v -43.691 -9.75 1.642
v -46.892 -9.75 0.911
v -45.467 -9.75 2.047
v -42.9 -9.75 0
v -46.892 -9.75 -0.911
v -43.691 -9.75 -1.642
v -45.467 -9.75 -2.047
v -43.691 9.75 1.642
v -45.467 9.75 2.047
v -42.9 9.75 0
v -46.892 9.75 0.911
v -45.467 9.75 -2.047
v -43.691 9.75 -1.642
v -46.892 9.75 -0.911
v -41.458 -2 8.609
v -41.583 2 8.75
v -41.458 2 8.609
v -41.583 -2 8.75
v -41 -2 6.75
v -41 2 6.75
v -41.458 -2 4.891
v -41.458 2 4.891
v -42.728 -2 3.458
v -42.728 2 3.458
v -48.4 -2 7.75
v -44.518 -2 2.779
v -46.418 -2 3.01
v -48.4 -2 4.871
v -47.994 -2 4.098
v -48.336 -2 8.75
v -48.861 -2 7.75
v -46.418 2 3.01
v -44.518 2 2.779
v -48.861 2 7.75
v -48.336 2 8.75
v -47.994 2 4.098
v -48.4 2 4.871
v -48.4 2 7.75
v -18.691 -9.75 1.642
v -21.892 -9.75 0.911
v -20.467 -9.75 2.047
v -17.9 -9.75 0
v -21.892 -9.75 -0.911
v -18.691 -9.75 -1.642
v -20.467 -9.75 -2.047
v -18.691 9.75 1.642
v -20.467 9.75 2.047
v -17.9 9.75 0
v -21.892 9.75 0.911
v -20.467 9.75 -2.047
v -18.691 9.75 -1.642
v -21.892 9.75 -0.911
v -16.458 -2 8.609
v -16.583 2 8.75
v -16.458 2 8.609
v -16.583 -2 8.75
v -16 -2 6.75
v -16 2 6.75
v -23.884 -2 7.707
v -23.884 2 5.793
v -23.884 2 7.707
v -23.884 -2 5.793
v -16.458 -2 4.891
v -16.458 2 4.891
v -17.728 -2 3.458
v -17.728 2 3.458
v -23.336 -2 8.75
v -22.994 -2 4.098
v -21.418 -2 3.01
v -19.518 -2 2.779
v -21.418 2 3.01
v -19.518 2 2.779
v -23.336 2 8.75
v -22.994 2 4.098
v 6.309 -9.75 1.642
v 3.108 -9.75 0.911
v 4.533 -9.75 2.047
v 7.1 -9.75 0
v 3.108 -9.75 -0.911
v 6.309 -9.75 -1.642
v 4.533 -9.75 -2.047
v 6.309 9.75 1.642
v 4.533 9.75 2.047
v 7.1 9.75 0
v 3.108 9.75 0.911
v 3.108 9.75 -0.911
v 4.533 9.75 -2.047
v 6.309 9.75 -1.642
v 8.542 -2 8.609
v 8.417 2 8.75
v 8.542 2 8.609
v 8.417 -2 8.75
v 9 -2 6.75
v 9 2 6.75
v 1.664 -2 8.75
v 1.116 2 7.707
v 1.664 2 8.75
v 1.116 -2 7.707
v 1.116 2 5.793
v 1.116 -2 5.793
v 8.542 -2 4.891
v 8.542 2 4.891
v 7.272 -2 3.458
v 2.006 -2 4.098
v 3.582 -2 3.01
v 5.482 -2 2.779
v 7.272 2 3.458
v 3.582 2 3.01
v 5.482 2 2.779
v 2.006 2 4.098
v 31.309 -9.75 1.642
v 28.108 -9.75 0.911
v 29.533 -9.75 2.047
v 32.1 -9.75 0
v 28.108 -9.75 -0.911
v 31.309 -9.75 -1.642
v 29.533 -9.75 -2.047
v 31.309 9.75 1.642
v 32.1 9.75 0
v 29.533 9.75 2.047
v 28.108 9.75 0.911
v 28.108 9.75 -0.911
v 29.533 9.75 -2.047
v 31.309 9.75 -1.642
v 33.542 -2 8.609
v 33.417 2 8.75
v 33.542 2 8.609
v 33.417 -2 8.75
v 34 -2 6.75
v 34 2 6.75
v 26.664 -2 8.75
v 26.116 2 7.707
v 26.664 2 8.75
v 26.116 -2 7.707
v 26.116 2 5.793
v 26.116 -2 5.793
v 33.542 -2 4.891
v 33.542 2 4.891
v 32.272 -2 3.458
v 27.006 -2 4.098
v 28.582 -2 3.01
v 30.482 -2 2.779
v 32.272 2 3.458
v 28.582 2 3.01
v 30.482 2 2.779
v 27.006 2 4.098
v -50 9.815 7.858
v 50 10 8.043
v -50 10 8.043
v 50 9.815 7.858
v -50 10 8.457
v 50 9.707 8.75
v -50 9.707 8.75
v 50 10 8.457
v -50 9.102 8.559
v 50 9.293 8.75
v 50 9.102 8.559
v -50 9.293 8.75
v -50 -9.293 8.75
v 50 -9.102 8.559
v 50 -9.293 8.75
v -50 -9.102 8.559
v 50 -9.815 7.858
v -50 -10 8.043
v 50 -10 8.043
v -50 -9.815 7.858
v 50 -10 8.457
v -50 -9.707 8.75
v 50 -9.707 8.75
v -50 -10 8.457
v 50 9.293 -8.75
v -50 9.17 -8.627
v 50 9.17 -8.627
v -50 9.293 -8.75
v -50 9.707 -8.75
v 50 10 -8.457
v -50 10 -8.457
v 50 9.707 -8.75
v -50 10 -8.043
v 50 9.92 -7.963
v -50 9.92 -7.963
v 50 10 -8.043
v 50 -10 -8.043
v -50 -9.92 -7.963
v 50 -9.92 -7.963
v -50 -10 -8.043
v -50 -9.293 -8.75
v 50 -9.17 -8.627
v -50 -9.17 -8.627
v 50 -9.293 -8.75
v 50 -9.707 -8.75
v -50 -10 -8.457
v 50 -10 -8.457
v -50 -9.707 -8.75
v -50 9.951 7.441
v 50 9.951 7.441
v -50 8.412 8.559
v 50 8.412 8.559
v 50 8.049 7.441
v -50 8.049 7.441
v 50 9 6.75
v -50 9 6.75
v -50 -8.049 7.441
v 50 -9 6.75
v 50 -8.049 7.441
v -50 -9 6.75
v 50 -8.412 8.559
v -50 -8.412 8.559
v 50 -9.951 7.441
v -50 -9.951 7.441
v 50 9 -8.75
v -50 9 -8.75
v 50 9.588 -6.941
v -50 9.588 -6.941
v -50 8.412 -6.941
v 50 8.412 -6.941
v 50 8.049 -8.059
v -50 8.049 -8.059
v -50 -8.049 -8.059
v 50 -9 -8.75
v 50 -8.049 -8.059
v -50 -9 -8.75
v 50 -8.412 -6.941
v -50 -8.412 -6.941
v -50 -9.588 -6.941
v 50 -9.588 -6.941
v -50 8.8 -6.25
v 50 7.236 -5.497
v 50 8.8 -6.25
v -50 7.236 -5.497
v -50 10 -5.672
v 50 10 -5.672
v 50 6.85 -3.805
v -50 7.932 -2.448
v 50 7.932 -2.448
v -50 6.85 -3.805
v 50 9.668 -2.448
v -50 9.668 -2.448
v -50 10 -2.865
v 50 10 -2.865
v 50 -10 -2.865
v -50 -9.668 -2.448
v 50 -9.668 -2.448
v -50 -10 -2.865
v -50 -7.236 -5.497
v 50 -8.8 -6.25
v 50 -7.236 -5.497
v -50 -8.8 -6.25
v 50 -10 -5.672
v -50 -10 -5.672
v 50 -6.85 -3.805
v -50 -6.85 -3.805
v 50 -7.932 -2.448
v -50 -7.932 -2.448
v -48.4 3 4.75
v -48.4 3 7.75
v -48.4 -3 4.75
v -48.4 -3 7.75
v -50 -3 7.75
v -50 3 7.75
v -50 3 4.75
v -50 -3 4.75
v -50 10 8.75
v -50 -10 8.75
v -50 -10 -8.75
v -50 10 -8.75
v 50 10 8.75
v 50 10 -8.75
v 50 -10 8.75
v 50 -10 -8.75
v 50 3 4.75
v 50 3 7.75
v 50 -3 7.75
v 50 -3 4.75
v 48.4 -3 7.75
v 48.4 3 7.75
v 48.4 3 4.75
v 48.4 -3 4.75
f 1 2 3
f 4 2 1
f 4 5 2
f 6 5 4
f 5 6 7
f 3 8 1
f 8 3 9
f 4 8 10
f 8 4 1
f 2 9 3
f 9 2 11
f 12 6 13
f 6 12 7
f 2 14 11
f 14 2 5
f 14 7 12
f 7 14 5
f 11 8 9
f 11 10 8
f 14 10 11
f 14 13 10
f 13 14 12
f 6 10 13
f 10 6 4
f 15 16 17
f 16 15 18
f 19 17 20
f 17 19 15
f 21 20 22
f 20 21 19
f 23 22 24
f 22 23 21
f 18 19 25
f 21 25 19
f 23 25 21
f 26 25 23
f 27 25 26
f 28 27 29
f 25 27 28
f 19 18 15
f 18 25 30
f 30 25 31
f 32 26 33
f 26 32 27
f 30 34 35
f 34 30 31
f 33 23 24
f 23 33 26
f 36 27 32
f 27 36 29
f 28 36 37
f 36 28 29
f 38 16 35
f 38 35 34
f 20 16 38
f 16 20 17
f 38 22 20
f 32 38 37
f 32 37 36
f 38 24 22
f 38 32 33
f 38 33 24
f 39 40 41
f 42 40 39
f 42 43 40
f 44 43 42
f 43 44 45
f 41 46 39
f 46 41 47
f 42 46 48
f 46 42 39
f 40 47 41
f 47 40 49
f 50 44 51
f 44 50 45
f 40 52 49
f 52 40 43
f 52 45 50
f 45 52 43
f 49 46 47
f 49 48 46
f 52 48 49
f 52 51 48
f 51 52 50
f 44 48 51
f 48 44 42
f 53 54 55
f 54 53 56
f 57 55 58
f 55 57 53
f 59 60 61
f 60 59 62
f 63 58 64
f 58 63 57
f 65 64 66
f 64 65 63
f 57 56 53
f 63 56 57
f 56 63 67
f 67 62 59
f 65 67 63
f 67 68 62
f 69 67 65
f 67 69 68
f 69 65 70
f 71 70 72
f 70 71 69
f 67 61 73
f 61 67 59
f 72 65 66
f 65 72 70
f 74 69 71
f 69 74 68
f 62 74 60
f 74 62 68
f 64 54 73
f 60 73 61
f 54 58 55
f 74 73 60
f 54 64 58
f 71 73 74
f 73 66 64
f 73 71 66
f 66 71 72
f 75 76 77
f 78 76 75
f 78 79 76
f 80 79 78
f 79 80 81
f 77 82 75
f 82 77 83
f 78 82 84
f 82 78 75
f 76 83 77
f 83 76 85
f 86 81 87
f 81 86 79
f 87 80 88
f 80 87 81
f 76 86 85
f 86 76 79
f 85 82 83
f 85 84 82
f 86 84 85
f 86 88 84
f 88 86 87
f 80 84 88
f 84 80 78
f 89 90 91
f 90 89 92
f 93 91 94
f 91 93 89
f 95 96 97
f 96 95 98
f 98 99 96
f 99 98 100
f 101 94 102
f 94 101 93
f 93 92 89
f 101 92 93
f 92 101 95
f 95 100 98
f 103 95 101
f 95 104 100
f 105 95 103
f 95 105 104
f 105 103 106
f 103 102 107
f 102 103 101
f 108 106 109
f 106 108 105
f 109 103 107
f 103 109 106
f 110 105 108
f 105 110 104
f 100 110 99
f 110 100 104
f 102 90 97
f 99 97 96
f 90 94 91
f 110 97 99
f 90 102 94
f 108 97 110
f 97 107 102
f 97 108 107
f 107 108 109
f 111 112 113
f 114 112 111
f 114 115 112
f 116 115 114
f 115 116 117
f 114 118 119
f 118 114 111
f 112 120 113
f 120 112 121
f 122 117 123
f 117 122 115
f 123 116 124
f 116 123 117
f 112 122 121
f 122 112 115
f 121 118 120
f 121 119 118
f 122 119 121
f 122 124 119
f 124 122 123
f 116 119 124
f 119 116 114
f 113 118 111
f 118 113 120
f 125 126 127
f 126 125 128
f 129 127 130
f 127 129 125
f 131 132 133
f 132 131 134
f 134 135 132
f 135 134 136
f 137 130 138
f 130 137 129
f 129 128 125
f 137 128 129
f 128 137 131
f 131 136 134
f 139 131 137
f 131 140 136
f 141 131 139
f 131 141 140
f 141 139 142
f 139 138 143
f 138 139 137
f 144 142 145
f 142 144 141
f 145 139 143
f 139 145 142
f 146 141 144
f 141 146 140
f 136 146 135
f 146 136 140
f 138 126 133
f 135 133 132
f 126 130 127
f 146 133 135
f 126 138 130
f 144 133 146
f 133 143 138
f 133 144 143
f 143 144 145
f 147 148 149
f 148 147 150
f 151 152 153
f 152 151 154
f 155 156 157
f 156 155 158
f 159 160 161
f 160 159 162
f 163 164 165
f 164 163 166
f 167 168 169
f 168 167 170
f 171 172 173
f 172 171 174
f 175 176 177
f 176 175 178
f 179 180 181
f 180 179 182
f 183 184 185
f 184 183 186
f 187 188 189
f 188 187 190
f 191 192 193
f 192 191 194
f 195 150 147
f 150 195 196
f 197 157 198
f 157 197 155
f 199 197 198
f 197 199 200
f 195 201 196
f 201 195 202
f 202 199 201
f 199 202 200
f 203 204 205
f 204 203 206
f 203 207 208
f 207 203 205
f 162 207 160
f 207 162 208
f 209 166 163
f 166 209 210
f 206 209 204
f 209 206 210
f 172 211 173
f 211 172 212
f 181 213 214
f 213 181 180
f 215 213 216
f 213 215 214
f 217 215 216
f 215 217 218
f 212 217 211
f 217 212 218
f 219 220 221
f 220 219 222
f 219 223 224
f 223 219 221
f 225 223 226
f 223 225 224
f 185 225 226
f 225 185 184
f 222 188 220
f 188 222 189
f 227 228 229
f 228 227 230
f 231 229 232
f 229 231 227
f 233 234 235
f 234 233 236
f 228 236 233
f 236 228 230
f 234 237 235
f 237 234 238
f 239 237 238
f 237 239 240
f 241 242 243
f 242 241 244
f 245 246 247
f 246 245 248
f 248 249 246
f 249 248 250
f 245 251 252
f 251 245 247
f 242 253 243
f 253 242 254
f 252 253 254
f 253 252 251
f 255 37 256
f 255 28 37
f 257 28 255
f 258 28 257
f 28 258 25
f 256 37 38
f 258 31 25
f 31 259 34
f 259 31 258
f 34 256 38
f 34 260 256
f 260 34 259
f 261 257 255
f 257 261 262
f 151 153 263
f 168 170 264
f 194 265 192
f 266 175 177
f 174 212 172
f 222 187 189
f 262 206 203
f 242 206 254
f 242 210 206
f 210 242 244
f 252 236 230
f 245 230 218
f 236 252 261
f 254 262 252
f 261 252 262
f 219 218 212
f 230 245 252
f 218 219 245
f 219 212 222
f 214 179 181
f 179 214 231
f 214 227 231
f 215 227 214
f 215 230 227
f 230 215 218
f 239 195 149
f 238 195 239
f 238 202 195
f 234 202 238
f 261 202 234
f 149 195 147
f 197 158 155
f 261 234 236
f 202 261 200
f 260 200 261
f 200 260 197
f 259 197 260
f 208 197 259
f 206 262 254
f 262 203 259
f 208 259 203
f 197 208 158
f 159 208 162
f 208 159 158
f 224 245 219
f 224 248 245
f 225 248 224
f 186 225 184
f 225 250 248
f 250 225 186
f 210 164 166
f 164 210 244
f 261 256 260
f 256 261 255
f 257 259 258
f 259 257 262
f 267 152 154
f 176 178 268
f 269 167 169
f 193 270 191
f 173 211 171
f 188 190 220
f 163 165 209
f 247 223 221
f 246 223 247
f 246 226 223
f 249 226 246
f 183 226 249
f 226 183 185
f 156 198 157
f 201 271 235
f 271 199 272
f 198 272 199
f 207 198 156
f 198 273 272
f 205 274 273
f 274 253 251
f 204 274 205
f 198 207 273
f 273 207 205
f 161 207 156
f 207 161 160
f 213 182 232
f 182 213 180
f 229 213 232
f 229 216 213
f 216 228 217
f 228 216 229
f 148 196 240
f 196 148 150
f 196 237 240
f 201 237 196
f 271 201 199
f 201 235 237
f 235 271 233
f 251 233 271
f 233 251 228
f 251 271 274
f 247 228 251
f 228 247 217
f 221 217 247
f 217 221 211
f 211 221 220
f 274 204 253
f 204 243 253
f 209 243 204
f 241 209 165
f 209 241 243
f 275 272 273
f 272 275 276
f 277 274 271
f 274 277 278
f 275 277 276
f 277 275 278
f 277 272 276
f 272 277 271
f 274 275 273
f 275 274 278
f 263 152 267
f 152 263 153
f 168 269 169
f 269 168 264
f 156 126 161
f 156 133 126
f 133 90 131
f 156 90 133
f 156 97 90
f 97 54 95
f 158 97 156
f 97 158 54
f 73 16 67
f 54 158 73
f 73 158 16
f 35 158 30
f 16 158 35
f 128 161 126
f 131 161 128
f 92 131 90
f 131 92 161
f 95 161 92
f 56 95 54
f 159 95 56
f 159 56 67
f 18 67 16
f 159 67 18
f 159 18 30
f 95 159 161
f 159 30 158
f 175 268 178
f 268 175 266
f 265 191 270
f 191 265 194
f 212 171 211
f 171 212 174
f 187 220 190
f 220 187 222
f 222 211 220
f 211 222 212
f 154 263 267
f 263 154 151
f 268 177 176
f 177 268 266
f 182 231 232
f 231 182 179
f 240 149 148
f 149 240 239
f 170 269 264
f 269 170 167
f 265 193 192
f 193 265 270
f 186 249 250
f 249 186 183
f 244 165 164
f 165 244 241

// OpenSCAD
// Parameters
rail_L = 100.0; //[50.0:200.0:1]
rail_W = 20.0; //[10.0:40.0:0.5]
rail_H = 17.5; //[8.75:35.0:0.5]
hole_d = 4.2; //[2.0:8.0:0.1]
hole_pitch = 25.0; //[10.0:60.0:1]
hole_edge_offset = 5.0; //[2.5:12.0:0.5]
hole_count = 4; //[2:8:1]
hole_csk_d = 8.0; //[5.0:14.0:0.5]
hole_csk_angle = 90.0; //[60.0:120.0:1]
overlap = 1.0; //[0.5:2.0:0.1]
edge_chamfer = 1.0; //[0.5:2.5:0.1]
fillet_r = 1.0; //[0.5:3.0:0.1]
groove_r = 2.0; //[1.0:4.0:0.1]
groove_depth = 1.2; //[0.5:3.0:0.1]
groove_z = 4.5; //[2.0:8.0:0.1]
csk_depth = 3.0; //[1.0:6.0:0.1]
end_mark_depth = 0.6; //[0.2:1.5:0.1]
end_mark_W = 6.0; //[3.0:12.0:0.5]
end_mark_H = 3.0; //[1.5:8.0:0.5]

// Rail Body
module rail_body() {
  color("Silver")
  cube([rail_L, rail_W, rail_H], center=true);
}

// Mounting Holes
module mounting_holes_pattern() {
  union() {
    for (i = [0:hole_count-1]) {
      translate([-rail_L/2 + hole_edge_offset + i*hole_pitch, 0, 0])
      rotate([90, 0, 0])
      cylinder(h=rail_H + 2*overlap, r=hole_d/2, center=true);
      
      translate([-rail_L/2 + hole_edge_offset + i*hole_pitch, 0, rail_H/2 - (csk_depth + overlap)/2])
      rotate([90, 0, 0])
      cylinder(h=csk_depth + overlap, r=hole_csk_d/2, center=true);
    }
  }
}

// Edge Chamfers
module edge_chamfers() {
  union() {
    translate([0, rail_W/2 - edge_chamfer/2, rail_H/2 - edge_chamfer/2])
    rotate([45, 0, 0])
    cube([rail_L + 2*overlap, edge_chamfer, edge_chamfer], center=true);
    
    translate([0, -rail_W/2 + edge_chamfer/2, rail_H/2 - edge_chamfer/2])
    rotate([-45, 0, 0])
    cube([rail_L + 2*overlap, edge_chamfer, edge_chamfer], center=true);
    
    translate([0, rail_W/2 - edge_chamfer/2, -rail_H/2 + edge_chamfer/2])
    rotate([-45, 0, 0])
    cube([rail_L + 2*overlap, edge_chamfer, edge_chamfer], center=true);
    
    translate([0, -rail_W/2 + edge_chamfer/2, -rail_H/2 + edge_chamfer/2])
    rotate([45, 0, 0])
    cube([rail_L + 2*overlap, edge_chamfer, edge_chamfer], center=true);
  }
}

// Corner Fillets
module corner_fillets() {
  union() {
    translate([0, rail_W/2 - fillet_r, rail_H/2 - fillet_r])
    rotate([0, 90, 0])
    cylinder(h=rail_L + 2*overlap, r=fillet_r, center=true);
    
    translate([0, -rail_W/2 + fillet_r, rail_H/2 - fillet_r])
    rotate([0, 90, 0])
    cylinder(h=rail_L + 2*overlap, r=fillet_r, center=true);
    
    translate([0, rail_W/2 - fillet_r, -rail_H/2 + fillet_r])
    rotate([0, 90, 0])
    cylinder(h=rail_L + 2*overlap, r=fillet_r, center=true);
    
    translate([0, -rail_W/2 + fillet_r, -rail_H/2 + fillet_r])
    rotate([0, 90, 0])
    cylinder(h=rail_L + 2*overlap, r=fillet_r, center=true);
  }
}

// Raceway Grooves
module raceway_grooves() {
  union() {
    translate([0, rail_W/2 - groove_depth, -rail_H/2 + groove_z])
    rotate([0, 90, 0])
    cylinder(h=rail_L + 2*overlap, r=groove_r, center=true);
    
    translate([0, -rail_W/2 + groove_depth, -rail_H/2 + groove_z])
    rotate([0, 90, 0])
    cylinder(h=rail_L + 2*overlap, r=groove_r, center=true);
  }
}

// End Markings
module end_markings() {
  union() {
    translate([-rail_L/2 + (end_mark_depth + overlap)/2, 0, rail_H/2 - end_mark_H/2 - edge_chamfer])
    cube([end_mark_depth + overlap, end_mark_W, end_mark_H], center=true);
    
    translate([rail_L/2 - (end_mark_depth + overlap)/2, 0, rail_H/2 - end_mark_H/2 - edge_chamfer])
    cube([end_mark_depth + overlap, end_mark_W, end_mark_H], center=true);
  }
}

// Final Rail with Features
difference() {
  rail_body();
  mounting_holes_pattern();
  edge_chamfers();
  corner_fillets();
  raceway_grooves();
  end_markings();
}
